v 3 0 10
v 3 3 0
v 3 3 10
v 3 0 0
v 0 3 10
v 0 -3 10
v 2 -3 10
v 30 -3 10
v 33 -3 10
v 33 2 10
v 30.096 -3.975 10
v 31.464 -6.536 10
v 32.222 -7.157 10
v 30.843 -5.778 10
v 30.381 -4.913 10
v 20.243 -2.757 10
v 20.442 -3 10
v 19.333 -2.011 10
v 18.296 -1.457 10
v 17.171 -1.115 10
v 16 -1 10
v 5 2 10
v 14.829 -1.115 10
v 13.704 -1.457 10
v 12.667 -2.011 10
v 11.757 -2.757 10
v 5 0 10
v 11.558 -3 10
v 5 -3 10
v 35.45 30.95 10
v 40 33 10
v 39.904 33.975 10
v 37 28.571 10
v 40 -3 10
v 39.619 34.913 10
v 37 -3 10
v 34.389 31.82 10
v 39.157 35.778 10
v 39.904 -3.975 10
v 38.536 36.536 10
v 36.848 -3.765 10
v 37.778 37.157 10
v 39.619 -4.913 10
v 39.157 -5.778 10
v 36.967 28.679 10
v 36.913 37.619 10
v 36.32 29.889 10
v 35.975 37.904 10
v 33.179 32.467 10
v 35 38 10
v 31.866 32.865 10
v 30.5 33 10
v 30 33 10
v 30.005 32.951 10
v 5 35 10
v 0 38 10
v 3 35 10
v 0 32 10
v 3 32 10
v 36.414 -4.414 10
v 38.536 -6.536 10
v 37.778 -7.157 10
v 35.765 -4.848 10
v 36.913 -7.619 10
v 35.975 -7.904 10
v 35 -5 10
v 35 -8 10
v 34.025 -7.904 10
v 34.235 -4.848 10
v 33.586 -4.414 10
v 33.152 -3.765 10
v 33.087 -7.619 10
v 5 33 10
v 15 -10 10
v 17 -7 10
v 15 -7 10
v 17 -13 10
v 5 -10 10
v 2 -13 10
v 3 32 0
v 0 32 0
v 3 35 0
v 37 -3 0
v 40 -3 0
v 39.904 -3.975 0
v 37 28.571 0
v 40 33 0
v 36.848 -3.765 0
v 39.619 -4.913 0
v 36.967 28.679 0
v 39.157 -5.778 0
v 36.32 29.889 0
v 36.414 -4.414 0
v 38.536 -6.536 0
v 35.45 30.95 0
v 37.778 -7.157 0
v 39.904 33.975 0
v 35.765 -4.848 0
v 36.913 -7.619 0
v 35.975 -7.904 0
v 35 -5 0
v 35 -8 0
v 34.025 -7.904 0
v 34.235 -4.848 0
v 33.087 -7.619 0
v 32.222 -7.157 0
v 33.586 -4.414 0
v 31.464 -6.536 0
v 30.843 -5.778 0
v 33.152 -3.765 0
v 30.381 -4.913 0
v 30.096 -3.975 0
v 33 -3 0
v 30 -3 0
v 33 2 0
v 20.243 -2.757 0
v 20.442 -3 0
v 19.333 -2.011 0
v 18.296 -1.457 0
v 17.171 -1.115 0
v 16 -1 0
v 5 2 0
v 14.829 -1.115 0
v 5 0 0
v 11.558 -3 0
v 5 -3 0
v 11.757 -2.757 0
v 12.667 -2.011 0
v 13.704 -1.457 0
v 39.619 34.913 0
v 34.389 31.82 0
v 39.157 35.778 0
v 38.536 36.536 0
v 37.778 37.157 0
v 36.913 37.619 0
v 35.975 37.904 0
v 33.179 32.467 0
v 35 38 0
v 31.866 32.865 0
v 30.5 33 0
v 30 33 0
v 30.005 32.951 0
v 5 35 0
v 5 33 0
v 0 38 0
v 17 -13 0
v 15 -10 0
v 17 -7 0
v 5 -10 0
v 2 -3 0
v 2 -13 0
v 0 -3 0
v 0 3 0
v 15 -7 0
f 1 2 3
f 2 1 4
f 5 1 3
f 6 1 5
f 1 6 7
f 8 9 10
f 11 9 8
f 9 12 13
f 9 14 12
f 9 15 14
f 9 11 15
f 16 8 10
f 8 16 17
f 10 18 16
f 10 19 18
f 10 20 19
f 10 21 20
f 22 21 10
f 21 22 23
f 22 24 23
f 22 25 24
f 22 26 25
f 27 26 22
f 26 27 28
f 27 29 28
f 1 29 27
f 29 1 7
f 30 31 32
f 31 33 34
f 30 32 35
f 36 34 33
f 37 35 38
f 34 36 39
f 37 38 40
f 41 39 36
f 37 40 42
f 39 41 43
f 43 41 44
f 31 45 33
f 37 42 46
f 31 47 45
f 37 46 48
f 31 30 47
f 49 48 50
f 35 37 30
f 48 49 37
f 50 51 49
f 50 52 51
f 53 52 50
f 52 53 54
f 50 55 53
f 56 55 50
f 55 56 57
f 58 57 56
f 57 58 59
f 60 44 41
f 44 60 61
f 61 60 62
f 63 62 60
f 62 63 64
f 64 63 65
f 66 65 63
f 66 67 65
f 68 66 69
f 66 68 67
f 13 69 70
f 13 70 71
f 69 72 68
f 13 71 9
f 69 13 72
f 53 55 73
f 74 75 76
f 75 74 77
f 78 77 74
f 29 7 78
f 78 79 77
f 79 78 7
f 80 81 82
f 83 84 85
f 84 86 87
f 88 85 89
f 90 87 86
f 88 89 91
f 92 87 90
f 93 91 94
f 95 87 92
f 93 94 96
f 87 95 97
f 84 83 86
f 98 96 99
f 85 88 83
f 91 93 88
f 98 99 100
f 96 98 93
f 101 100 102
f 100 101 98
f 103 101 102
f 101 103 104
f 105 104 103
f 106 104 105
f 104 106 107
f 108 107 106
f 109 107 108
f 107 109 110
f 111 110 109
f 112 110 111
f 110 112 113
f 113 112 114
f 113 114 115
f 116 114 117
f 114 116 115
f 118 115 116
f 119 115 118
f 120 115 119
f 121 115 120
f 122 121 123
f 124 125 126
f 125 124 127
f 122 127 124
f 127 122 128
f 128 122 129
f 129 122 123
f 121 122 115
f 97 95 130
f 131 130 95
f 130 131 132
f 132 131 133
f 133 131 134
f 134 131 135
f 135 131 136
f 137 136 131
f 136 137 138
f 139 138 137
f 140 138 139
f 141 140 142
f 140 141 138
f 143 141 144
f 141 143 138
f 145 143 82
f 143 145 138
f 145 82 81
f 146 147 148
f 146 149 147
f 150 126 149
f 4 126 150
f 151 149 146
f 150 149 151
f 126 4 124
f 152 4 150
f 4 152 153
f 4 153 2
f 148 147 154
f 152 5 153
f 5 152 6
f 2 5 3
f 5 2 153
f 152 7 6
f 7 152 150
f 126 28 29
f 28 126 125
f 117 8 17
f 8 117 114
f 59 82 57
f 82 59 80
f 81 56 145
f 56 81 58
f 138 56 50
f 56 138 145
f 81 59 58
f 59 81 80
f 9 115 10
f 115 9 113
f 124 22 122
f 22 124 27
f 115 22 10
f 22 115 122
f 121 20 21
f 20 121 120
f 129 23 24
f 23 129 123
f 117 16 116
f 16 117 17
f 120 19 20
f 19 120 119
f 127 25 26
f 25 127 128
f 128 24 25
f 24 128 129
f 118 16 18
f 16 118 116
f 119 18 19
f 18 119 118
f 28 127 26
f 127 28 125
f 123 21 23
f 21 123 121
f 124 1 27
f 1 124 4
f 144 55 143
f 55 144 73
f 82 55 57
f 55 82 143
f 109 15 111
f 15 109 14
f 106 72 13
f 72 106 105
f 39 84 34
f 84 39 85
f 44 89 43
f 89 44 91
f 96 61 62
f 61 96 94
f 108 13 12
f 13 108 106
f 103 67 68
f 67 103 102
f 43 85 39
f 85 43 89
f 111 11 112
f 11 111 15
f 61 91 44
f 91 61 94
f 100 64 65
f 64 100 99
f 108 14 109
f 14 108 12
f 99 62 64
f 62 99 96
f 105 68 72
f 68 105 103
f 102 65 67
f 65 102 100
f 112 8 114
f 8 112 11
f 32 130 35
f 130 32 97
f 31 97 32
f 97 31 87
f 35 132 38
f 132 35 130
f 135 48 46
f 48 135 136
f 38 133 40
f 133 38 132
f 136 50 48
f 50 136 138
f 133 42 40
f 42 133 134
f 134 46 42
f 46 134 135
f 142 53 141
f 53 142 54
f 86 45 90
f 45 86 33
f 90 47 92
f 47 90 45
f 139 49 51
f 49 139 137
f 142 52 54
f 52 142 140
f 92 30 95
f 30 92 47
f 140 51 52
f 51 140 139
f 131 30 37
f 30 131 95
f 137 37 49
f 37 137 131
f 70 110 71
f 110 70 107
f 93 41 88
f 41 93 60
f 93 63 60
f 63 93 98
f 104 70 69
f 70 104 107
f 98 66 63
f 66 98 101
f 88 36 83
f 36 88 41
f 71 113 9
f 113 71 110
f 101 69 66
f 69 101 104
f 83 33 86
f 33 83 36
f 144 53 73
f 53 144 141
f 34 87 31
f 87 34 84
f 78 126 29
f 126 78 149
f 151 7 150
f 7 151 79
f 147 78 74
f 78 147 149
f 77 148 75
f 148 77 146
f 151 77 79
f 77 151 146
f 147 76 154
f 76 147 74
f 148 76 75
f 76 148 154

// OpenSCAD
// Author    KMS - Martin Dubois, P. Eng.
// Copyright (C) 2023 KMS
// Product   DIN
// File      Cap/Cap.scad

Cap( 30.0, 10.0 );

module Cap( aSizeX, aSizeZ )
{
    for ( y = [ - TICK, DIN_Y - TICK ] )
    {
        translate( [ 0, y, 0 ] )
            cube( [ TICK, 2 * TICK, aSizeZ ] );
    }

    translate( [ 5, DIN_Y - 2, 0 ] )
        cube( [ aSizeX, 5, aSizeZ ] );

    difference()
    {
        translate( [ 5, - TICK, 0 ] )
            cube( [ aSizeX - 2, 5, aSizeZ ] );

        translate( [ aSizeX / 2 + 1, - TICK - 4, - EPS ] )
            cylinder( 2 * EPS + aSizeZ, 6, 6, $fn = 32 );
    }

    for ( y = [ - TICK, DIN_Y ] )
    {
        translate( [ TICK, y, 0 ] )
            cube( [ 2, TICK, aSizeZ ] );
    }

    difference()
    {
        for ( y = [ - 3, DIN_Y + 3 - 5 ] )
        {
            translate( [ aSizeX + 5, y, 0 ] )
                cylinder( aSizeZ, CORNER_R, CORNER_R, $fn = 32 );
        }

        translate( [ aSizeX + 0.5, DIN_Y - 9, - EPS ] )
            cylinder( 2 * EPS + aSizeZ, 7, 7, $fn = 32 );

        translate( [ aSizeX + 5, - TICK, - EPS ] )
            cylinder( 2 * EPS + aSizeZ, 2, 2, $fn = 16 );

        translate( [ aSizeX + 5 - 2, - TICK, - EPS ] )
            cube( [ 4, 5, 2 * EPS + aSizeZ ] );
    }

    translate( [ aSizeX + 7, - TICK, 0 ] )
        cube( [ TICK, DIN_Y + 1, aSizeZ ] );

    translate( [ 2, - 10, 0 ] )
        cube( [ TICK, 7, aSizeZ ] );

    translate( [ 2, - 10 - TICK, 0 ] )
        cube( [ aSizeX / 2, TICK, aSizeZ ] );

    translate( [ aSizeX / 2, - 10, 0 ] )
        cube( [ 2, 3, aSizeZ ] );
}

// Private
// //////////////////////////////////////////////////////////////////////////

CORNER_R = 5.0;

DIN_Y = 35;

EPS = 0.1;

TICK = 3.0;
